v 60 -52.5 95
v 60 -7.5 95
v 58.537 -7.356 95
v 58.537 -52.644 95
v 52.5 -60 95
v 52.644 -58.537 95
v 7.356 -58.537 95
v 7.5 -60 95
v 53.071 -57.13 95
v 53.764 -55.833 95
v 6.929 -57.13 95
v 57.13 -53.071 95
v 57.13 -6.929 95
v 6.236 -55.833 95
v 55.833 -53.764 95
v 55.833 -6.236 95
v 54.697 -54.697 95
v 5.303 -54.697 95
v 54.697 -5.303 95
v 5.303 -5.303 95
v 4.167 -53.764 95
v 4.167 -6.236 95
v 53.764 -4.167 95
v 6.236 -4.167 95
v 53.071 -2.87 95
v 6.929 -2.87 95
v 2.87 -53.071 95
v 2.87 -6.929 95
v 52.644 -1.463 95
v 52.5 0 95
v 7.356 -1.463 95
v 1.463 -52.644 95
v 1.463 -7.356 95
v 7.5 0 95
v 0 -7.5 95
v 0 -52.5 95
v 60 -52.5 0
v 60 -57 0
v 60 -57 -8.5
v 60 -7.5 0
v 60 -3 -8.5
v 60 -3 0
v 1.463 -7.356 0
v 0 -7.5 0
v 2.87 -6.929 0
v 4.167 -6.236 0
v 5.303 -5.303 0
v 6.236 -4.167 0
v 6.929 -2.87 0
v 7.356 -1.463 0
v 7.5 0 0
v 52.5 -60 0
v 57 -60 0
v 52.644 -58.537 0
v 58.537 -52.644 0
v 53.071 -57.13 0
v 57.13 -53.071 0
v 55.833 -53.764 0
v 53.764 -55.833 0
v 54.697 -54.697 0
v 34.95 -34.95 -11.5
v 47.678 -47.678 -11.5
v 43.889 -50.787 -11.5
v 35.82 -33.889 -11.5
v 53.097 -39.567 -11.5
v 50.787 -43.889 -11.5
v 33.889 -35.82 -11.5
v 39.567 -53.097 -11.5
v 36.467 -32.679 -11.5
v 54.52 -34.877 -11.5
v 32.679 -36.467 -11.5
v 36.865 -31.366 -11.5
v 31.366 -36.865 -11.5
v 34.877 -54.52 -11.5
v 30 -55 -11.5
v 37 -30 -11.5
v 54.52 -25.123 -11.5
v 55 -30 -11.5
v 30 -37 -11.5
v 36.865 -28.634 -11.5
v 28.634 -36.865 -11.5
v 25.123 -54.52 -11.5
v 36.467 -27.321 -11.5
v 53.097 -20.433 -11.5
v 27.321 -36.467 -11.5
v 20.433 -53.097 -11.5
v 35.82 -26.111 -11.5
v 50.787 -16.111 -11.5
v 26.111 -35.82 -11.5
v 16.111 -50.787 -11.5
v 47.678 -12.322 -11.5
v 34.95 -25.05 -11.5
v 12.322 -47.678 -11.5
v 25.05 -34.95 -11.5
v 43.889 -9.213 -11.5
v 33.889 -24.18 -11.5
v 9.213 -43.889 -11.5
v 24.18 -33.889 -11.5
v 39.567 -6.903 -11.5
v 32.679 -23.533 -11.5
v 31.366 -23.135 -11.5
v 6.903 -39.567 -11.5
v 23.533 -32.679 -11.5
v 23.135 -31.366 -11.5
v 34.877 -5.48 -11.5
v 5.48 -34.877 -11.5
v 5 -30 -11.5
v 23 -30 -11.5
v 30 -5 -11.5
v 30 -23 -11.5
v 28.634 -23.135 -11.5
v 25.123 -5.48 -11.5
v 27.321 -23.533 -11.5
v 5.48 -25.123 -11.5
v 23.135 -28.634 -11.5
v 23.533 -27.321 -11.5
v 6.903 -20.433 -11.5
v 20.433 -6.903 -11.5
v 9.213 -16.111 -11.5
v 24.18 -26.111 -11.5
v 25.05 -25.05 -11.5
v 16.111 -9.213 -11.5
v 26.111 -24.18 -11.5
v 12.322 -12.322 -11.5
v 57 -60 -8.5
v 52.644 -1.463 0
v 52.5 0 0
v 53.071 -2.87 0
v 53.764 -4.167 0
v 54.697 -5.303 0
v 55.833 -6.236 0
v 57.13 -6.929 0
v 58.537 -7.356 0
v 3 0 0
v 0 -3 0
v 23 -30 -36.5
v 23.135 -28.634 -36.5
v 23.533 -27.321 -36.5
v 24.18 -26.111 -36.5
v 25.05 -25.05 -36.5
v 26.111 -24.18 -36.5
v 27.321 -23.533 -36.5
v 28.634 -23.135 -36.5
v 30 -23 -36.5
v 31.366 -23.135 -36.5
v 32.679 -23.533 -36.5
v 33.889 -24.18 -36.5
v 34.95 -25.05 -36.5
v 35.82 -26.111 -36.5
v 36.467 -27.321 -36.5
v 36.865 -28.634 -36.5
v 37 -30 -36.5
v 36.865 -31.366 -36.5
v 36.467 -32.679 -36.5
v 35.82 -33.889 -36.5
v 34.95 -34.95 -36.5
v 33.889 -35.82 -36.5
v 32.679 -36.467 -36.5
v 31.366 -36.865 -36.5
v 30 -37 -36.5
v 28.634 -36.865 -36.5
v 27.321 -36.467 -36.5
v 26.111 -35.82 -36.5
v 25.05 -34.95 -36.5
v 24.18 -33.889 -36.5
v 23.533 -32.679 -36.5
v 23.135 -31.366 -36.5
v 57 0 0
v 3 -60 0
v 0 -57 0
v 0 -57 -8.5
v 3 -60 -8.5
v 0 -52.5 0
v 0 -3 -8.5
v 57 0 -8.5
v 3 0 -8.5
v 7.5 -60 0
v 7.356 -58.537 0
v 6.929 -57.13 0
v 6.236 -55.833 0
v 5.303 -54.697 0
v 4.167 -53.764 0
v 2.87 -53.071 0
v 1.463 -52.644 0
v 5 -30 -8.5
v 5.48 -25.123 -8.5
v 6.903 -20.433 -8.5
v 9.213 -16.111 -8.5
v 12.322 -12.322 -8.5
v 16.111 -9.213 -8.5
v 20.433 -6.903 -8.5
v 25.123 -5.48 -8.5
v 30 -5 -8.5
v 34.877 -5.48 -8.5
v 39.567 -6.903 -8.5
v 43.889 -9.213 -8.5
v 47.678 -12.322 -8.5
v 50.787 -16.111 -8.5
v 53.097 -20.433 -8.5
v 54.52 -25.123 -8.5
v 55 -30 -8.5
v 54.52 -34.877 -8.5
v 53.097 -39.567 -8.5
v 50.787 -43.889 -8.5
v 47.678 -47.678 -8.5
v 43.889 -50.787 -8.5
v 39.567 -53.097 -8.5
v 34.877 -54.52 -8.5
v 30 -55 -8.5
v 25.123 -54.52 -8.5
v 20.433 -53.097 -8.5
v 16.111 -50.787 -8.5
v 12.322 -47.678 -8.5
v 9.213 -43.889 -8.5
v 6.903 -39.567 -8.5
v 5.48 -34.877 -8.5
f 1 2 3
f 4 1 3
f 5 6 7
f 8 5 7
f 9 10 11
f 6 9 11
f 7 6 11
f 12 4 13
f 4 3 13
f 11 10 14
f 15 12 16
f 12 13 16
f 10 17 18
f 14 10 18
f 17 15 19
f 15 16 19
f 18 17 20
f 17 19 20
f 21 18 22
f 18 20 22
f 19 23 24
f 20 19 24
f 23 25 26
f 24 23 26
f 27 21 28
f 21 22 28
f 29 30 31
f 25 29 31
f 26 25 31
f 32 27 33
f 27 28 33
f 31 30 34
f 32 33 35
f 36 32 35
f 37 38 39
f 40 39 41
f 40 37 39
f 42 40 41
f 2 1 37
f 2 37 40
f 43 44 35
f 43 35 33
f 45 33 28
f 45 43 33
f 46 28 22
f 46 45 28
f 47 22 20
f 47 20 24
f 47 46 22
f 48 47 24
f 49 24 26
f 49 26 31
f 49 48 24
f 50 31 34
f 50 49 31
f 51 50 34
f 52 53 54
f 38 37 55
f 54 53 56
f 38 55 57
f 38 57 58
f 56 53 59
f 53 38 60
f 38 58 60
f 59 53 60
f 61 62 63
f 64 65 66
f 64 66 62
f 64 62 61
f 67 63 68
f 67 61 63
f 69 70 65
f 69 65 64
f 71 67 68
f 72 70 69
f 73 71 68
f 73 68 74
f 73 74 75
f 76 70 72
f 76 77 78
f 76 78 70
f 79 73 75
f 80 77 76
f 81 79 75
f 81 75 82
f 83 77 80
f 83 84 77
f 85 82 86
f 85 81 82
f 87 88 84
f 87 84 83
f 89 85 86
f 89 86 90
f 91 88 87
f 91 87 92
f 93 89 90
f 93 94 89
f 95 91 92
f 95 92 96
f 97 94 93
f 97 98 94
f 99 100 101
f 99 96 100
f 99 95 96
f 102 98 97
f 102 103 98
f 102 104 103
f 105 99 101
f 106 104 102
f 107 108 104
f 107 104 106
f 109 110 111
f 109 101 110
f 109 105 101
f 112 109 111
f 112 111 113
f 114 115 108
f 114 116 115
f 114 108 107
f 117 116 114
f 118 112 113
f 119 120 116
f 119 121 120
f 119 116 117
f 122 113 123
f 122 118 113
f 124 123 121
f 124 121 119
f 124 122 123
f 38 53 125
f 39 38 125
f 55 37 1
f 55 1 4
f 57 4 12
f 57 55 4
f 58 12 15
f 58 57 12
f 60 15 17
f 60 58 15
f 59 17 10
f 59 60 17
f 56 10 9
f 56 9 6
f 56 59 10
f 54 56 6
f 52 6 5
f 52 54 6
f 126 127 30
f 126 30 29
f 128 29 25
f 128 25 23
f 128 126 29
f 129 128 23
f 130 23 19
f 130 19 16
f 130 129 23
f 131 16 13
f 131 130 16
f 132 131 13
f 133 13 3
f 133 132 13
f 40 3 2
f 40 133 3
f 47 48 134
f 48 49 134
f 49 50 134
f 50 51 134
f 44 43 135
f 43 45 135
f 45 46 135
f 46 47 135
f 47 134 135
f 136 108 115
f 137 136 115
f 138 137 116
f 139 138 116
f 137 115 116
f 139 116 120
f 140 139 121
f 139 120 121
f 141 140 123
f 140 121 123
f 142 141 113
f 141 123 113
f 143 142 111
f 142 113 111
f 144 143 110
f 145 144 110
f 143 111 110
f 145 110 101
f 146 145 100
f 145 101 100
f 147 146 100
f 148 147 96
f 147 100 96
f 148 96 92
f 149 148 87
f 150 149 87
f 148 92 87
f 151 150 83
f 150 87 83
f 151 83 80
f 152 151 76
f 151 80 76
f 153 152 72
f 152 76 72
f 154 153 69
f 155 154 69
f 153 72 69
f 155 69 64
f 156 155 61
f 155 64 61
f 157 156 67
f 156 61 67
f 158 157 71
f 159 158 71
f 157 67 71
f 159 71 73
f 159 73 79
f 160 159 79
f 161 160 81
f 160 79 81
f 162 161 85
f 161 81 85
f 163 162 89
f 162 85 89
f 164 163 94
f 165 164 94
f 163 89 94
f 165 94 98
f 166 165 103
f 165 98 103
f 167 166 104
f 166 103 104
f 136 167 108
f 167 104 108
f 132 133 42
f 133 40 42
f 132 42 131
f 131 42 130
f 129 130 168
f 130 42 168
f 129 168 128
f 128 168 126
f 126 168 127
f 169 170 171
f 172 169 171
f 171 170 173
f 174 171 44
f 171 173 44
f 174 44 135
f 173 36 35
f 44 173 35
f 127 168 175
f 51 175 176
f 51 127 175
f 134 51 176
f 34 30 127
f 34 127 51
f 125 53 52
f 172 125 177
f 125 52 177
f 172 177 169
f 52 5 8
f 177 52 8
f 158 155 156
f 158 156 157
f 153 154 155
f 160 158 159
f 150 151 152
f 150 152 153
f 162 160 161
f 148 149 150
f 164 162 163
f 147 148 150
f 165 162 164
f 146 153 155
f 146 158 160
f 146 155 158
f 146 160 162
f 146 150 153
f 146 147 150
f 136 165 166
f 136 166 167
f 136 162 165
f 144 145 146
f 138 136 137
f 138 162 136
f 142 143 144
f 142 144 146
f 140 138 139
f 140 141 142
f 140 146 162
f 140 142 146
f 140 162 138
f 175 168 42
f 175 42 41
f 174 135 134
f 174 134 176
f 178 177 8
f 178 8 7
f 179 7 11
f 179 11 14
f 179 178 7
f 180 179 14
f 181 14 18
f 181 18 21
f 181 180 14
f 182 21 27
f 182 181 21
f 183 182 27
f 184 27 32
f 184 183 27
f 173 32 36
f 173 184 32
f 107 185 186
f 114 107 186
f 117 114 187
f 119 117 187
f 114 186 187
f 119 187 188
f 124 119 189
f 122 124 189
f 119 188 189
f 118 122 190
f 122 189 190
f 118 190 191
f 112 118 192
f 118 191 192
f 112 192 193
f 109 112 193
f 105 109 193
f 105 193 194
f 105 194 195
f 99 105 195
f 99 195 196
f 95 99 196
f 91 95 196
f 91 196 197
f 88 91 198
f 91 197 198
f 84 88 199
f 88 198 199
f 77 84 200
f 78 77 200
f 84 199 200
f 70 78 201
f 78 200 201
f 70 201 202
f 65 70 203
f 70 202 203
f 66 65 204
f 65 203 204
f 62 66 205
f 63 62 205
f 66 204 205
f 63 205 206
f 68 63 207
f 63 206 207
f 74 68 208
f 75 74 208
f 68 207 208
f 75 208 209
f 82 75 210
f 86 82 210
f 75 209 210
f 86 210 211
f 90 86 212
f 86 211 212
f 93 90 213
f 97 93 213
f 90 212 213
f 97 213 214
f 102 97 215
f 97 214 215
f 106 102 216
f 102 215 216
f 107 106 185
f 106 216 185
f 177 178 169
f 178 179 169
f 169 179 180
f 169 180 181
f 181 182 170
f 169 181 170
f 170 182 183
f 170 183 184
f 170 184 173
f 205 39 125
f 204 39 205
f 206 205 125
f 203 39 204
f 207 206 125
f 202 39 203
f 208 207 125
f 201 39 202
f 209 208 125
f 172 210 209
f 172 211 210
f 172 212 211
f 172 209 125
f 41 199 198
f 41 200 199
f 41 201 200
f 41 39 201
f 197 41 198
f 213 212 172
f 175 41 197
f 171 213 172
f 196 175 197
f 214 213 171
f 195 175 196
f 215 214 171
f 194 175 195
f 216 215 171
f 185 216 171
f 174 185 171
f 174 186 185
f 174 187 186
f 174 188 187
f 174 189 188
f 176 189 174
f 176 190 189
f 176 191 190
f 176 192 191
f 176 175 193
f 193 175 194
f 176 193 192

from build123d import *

# Parameters (mm, degrees)
EXTRUDE_1_DEPTH = 95
SKETCH_3_W      = 60
SKETCH_3_H      = 60
EXTRUDE_3_DEPTH = 8.5
SKETCH_5_R      = 25
EXTRUDE_5_DEPTH = 3
SKETCH_7_R      = 7
EXTRUDE_6_DEPTH = 25
CHAMFER_1_SIZE  = 3


with BuildPart() as part:
    # 草图1 → 凸台-拉伸1 (new body)
    with BuildSketch(Plane.XY):
        with BuildLine():
            Line((7.5, 0), (52.5, 0))
            ThreePointArc((52.5, 0), (54.696699141, -5.303300859), (60, -7.5))
            Line((60, -7.5), (60, -52.5))
            ThreePointArc((60, -52.5), (54.696699141, -54.696699141), (52.5, -60))
            Line((52.5, -60), (7.5, -60))
            ThreePointArc((7.5, -60), (5.303300859, -54.696699141), (0, -52.5))
            Line((0, -52.5), (0, -7.5))
            ThreePointArc((0, -7.5), (5.303300859, -5.303300859), (7.5, 0))
        make_face()
    extrude(amount=EXTRUDE_1_DEPTH)

    # 草图3 → 凸台-拉伸3 (add)
    with BuildSketch(Plane(origin=(0, 0, 0), x_dir=(-1, 0, 0), z_dir=(0, 0, -1))):
        with Locations((-30, -30)):
            Rectangle(SKETCH_3_W, SKETCH_3_H)
    extrude(amount=EXTRUDE_3_DEPTH)

    # 草图5 → 凸台-拉伸5 (add)
    with BuildSketch(Plane(origin=(0, 0, -8.5), x_dir=(-1, 0, 0), z_dir=(0, 0, -1))):
        with Locations((-30, -30)):
            Circle(SKETCH_5_R)
    extrude(amount=EXTRUDE_5_DEPTH)

    # 草图7 → 凸台-拉伸6 (add)
    with BuildSketch(Plane(origin=(0, 0, -11.5), x_dir=(-1, 0, 0), z_dir=(0, 0, -1))):
        with Locations((-30, -30)):
            Circle(SKETCH_7_R)
    extrude(amount=EXTRUDE_6_DEPTH)

    # 倒角1
    chamfer_1_edges = [part.edges().sort_by_distance(p)[0] for p in [
        (0, -60, -4.25),
        (0, 0, -4.25),
        (60, 0, -4.25),
        (60, -60, -4.25),
    ]]
    chamfer(chamfer_1_edges, length=CHAMFER_1_SIZE)


solid = part.part
